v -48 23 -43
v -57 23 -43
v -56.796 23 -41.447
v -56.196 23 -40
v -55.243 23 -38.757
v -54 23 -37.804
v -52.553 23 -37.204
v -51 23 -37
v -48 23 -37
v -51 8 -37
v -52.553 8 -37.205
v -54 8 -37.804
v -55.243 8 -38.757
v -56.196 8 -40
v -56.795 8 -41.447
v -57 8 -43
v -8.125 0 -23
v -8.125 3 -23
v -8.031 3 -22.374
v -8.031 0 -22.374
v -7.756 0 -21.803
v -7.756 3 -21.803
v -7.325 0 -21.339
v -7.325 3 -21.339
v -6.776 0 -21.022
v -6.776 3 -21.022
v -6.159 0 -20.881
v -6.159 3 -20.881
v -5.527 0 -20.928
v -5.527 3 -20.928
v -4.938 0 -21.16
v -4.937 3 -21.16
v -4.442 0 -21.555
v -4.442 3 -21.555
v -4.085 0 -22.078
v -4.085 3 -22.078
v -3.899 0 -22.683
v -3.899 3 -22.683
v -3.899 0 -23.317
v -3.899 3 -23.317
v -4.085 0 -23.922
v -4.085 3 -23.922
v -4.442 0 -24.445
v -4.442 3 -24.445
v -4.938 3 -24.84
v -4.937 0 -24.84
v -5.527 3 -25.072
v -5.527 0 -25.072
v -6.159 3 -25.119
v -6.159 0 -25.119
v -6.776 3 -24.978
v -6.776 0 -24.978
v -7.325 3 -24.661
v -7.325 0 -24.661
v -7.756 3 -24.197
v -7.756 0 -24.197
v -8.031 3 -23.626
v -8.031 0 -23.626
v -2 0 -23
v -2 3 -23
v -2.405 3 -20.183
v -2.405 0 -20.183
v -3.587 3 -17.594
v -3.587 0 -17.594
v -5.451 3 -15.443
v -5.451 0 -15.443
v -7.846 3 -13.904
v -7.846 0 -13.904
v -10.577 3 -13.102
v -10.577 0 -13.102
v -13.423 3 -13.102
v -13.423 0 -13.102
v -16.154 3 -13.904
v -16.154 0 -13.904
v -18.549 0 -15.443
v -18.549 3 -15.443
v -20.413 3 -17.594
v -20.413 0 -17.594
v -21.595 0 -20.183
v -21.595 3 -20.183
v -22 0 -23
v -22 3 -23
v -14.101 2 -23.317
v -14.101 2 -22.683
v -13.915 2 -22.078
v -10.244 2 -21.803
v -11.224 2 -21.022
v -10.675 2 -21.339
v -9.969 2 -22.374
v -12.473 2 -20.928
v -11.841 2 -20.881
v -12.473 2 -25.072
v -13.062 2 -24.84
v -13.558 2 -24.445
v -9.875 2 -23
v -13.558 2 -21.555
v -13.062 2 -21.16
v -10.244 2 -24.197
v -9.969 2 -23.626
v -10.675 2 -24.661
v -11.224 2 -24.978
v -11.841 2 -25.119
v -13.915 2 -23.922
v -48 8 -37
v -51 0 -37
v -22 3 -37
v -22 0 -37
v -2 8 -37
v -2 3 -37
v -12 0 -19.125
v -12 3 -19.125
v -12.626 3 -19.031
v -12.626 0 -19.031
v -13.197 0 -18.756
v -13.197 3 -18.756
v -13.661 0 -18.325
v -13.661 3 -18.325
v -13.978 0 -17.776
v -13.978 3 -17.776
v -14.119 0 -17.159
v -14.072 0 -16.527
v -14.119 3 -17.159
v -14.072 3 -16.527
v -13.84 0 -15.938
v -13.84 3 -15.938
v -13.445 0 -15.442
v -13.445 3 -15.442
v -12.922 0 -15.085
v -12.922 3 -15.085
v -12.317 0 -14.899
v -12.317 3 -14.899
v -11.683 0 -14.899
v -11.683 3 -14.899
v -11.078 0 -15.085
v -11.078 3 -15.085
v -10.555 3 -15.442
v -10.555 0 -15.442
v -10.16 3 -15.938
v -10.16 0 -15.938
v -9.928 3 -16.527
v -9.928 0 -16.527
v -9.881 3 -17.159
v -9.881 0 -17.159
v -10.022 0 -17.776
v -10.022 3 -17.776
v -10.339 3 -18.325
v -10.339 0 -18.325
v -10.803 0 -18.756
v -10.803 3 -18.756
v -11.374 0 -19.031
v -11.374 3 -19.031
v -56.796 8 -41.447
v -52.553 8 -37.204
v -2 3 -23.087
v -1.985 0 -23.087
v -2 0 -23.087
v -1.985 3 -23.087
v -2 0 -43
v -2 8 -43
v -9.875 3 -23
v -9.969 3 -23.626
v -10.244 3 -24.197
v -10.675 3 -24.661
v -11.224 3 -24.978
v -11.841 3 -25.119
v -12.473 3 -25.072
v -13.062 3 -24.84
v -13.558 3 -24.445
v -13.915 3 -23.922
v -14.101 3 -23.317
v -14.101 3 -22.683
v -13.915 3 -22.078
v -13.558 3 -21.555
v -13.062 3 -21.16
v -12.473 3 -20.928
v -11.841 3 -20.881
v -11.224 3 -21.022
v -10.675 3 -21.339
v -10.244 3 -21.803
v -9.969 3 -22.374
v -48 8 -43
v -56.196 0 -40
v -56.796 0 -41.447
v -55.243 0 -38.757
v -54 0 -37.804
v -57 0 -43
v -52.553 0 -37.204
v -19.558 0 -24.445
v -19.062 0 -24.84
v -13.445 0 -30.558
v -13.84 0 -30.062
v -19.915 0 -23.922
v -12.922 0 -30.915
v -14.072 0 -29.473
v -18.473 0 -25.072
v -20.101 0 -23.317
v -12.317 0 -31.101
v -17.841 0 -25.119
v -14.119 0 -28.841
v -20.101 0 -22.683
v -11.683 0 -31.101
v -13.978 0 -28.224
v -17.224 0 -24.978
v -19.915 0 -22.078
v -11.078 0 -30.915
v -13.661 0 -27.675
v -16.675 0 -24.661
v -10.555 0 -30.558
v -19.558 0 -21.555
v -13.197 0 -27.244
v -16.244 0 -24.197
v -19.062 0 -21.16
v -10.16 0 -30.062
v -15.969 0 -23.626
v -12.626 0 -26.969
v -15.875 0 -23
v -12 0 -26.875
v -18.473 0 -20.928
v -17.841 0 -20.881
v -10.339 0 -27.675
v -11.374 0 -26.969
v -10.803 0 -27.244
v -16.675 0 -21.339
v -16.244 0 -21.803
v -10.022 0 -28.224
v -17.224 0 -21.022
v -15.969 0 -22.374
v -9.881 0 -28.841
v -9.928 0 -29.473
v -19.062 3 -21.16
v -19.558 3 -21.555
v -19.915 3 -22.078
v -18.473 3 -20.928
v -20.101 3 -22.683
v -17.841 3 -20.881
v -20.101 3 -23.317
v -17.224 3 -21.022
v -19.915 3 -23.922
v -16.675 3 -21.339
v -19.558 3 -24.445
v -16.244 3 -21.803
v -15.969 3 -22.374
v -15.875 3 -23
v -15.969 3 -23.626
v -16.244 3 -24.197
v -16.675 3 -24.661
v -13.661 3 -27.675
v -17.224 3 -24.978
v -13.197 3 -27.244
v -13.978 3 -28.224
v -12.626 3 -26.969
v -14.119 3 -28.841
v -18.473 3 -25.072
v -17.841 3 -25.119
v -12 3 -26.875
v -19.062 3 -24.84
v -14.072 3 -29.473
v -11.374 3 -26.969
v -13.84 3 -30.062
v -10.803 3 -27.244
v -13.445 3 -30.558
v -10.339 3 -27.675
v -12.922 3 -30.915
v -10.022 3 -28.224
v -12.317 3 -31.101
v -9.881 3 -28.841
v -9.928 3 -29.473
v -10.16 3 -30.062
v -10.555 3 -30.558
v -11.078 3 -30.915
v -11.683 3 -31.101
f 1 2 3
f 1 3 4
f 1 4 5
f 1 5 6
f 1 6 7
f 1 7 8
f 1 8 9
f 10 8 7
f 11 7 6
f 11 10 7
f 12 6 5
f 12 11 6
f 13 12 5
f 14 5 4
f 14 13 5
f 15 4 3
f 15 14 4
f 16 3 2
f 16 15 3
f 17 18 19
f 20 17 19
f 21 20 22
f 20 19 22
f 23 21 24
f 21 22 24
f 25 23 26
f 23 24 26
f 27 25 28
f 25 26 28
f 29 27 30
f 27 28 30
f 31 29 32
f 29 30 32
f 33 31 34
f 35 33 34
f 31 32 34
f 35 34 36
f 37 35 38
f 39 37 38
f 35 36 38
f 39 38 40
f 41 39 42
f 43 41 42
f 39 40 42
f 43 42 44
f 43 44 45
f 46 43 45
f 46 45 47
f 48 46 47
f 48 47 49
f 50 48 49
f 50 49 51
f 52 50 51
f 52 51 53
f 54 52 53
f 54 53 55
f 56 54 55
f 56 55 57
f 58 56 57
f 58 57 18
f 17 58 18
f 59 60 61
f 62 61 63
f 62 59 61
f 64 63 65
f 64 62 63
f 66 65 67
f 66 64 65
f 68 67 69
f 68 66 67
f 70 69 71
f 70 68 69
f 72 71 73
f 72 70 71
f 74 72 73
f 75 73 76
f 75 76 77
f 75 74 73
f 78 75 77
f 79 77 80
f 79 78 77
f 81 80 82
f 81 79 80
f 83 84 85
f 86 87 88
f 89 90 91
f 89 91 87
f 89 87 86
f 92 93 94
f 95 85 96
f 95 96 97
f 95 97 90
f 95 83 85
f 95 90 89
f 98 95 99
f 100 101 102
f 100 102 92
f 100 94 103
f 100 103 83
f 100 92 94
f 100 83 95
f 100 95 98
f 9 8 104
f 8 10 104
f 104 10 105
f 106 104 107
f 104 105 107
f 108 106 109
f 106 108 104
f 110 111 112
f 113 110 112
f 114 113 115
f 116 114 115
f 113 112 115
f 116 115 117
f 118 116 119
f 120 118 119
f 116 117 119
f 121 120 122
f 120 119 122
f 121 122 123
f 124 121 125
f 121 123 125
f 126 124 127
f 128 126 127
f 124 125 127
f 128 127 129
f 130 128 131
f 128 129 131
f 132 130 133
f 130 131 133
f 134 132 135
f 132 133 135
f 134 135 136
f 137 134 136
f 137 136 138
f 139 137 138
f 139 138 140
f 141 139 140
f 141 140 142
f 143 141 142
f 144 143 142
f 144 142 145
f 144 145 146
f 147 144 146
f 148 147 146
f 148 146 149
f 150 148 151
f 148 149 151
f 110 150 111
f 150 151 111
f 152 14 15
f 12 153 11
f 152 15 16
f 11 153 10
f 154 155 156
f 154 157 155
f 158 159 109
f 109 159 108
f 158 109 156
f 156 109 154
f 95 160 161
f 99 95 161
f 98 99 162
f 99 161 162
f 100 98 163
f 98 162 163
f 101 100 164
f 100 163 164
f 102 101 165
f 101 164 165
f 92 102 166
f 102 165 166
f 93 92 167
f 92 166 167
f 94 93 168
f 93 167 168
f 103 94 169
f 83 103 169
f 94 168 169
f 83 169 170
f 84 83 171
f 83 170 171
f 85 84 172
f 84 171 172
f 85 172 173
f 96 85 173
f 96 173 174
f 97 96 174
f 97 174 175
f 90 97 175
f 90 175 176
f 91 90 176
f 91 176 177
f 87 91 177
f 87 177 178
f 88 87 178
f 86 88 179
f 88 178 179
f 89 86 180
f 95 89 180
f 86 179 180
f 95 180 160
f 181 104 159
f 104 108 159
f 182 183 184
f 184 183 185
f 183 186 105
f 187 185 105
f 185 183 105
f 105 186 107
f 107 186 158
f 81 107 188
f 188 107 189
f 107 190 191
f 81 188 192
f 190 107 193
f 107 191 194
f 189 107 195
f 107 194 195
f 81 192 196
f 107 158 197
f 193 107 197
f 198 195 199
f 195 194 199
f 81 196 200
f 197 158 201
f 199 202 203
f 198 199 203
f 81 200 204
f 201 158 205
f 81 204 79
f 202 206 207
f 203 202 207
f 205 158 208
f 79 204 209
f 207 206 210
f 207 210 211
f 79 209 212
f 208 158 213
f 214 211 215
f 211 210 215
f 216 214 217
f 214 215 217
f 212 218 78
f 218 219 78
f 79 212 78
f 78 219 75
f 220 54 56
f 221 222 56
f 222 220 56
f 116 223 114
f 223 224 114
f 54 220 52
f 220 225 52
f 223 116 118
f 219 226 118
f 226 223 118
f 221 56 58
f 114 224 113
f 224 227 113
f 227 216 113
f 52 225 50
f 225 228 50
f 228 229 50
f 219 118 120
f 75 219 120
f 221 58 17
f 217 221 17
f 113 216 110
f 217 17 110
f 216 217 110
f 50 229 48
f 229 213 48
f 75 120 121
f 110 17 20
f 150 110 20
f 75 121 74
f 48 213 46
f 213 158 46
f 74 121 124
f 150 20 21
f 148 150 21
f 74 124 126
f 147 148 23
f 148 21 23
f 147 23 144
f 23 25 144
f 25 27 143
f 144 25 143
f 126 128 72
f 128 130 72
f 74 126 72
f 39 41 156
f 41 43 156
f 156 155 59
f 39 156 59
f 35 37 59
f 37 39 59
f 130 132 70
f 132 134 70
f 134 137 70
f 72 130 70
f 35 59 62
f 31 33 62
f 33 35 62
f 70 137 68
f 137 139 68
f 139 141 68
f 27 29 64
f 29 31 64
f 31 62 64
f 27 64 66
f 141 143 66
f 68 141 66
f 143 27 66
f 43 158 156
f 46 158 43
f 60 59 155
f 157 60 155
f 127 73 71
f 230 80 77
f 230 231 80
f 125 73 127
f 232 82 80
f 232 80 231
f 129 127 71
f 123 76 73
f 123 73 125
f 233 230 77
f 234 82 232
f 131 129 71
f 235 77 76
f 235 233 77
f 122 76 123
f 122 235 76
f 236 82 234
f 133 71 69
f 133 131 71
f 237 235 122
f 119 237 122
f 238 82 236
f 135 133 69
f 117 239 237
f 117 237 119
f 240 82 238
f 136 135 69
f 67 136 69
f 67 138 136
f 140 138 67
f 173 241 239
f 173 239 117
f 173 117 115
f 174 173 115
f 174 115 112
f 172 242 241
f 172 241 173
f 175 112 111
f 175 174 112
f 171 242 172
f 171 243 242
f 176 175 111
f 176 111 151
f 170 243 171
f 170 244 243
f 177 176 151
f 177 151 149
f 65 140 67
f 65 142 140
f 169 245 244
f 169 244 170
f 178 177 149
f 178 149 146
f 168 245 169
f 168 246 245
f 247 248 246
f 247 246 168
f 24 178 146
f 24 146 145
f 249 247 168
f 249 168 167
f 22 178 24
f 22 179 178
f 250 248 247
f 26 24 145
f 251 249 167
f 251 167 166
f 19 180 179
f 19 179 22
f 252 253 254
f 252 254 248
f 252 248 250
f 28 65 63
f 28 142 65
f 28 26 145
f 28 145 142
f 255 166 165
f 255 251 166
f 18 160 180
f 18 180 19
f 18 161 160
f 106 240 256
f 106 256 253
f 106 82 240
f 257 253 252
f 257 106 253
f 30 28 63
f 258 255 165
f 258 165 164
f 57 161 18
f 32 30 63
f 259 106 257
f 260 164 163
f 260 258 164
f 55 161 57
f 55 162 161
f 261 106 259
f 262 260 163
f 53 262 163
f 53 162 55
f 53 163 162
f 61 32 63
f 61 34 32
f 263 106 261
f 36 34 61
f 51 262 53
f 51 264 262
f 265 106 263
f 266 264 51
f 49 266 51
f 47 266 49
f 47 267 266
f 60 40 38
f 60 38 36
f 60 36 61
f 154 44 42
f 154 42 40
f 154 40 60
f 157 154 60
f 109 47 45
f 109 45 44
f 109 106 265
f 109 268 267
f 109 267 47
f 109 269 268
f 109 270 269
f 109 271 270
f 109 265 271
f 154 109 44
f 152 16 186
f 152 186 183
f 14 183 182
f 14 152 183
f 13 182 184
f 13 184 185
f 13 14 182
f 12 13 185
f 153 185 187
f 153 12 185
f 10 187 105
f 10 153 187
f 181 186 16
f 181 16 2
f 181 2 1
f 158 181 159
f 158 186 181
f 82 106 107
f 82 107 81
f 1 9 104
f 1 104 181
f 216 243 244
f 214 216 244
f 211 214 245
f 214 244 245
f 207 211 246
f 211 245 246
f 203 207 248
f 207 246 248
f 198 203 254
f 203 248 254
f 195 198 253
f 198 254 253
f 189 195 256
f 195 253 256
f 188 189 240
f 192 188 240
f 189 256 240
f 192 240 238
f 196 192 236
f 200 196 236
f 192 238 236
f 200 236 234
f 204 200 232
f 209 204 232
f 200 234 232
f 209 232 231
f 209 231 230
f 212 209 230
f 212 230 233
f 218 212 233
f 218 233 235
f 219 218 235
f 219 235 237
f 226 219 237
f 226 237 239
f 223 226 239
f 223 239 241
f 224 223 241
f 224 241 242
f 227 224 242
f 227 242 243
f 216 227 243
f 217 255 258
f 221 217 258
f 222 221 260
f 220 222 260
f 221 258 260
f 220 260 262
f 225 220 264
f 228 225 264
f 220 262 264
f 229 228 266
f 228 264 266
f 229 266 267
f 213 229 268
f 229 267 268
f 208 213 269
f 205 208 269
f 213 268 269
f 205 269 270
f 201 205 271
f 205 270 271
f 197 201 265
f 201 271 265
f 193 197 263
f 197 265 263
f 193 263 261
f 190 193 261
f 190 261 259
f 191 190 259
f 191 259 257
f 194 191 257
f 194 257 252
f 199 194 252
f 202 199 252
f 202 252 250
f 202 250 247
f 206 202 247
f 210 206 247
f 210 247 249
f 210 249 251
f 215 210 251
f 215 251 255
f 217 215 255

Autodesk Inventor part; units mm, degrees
ref_plane "YZ Plane" through (0, 0, 0) normal (1, 0, 0) x (0, 1, 0)
ref_plane "XZ Plane" through (0, 0, 0) normal (0, 1, 0) x (-1, 0, 0)
ref_plane "XY Plane" through (0, 0, 0) normal (0, 0, 1) x (1, 0, 0)
sketch "Sketch1" plane through (0, 0, 0) normal (0, 1, 0) x (-1, 0, 0)
  line L0 (0, 0) -> (24, 0)
  line L1 (12, 0) -> (12, -5)
  circle A0 centre (12, -5) radius 2.125
  dimension "d0" = 24
  dimension "d1" = 5
  dimension "d2" = 4.25
sketch "Sketch2" plane through (0, 0, 0) normal (0, 1, 0) x (-1, 0, 0)
  line L0 (24, 0) -> (24, 30)
  line L1 (24, 30) -> (0, 30)
  line L2 (0, 0) -> (0, -12.5)
  line L3 (0, -12.5) -> (24, -12.5)
  line L4 (24, -12.5) -> (24, 0)
  line L5 (0, 25) -> (0, 0)
  line L6 (0, 25) -> (-29.86, 25)
  line L7 (0, 30) -> (-29.86, 30)
  line L8 (-29.86, 30) -> (-29.86, 25)
  dimension "d3" = 24
  dimension "d4" = 30
  dimension "d5" = 12.5
  dimension "d6" = 5
  dimension "d20" = 29.86
extrude "Extrusion1" add sketch "Sketch2" along normal blind 8
extrude "Extrusion2" cut sketch "Sketch1" along normal through all
pattern_linear "Rectangular Pattern1" count 2 spacing 6 along (1, 0, 0) count 2 spacing 6 along (-1, 0, 0) of "Extrusion2"
sketch "Sketch4" plane through (-24, 0, -12.5) normal (-1, 0, 0) x (0, 0, 1)
  point P0 (12.5, 0)
sketch "Sketch5" plane through (0, 8, 0) normal (0, 1, 0) x (1, 0, 0)
  line L0 (0, 0) -> (0, 12.5)
  line L1 (0, 12.5) -> (-24, 12.5)
  line L2 (-24, 12.5) -> (-24, 0)
  line L3 (-24, 0) -> (0, 0)
  line L4 (0, -25) -> (0, 12.5) projected
extrude "Extrusion3" cut sketch "Sketch5" against normal blind 5
sketch "Sketch6" plane through (0, 8, 0) normal (0, 1, 0) x (1, 0, 0)
  line L0 (13.1425, -25) -> (13.1425, 25)
  circle A0 centre (-12, 5) radius 2.125 projected
  line L1 (-12, 5) -> (-12, 23)
  circle A1 centre (-12, 23) radius 10
  line L2 (21.1928, 30) -> (23.1928, 30)
  line L3 (0, 35) -> (20, 35)
  line L4 (20, 35) -> (30.8046, 35) construction
  line L5 (20, 35) -> (37.0437, 35) construction
  line L6 (20, 35) -> (24.8301, 36.2923)
  line L7 (17.3205, 25) -> (22.3205, 25) construction
  line L8 (17.3205, 25) -> (12.3205, 25)
  line L9 (-2, 23) -> (0, 35)
  line L10 (-22, 23) -> (-22, 41)
  line L11 (-22, 41) -> (30, 41)
  line L12 (30, 41) -> (24.8301, 36.2923)
  point P0 (0, 0)
  dimension "d23" = 50
  dimension "d25" = 18
  dimension "d26" = 20
  dimension "d42" = 2
  dimension "d45" = 20
  dimension "d47" = 20
  dimension "d52" = 5
  dimension "d63" = 5
  dimension "d66" = 52
  dimension "d67" = 18
sketch "Sketch7" plane through (0, 0, 0) normal (0, -1, 0) x (1, 0, 0)
  circle A0 centre (-12, -5) radius 2.125 projected
  line L0 (-12, -5) -> (-12, -23)
  circle A1 centre (-12, -23) radius 10
  line L1 (-22, -23) -> (-22, -41)
  line L2 (-22, -41) -> (30, -41)
  line L3 (0, -34.9999) -> (20, -34.9999)
  line L4 (20, -34.9999) -> (24.851, -36.2115)
  line L5 (24.851, -36.2115) -> (30, -41)
  line L6 (0, -34.9999) -> (-2, -23)
  point P0 (0, 0)
  dimension "d27" = 18
  dimension "d28" = 20
  dimension "d68" = 18
  dimension "d69" = 52
  dimension "d70" = 20
  dimension "d71" = 5
extrude "Extrusion4" add sketch "Sketch7" against normal blind 3 contours A1
sketch "Sketch8" plane through (-12, 3, -23) normal (0, 1, 0) x (1, 0, 0)
  circle A0 centre (0, 0) radius 2.125
  point P0 (12, -23)
  dimension "d31" = 4.25
extrude "Extrusion5" cut sketch "Sketch8" against normal blind 1
sketch "Sketch9" plane through (-12, 3, -23) normal (0, 1, 0) x (1, 0, 0)
  line L0 (0, 0) -> (-6, 0)
  circle A0 centre (-6, 0) radius 2.125
  point P0 (12, -23)
  dimension "d34" = 6
  dimension "d35" = 4.25
extrude "Extrusion6" cut sketch "Sketch9" against normal through all
pattern_circular "Circular Pattern1" count 4 over 360 about axis through (-12, 0, -23) along (0, 1, 0) of "Extrusion6"
sketch "Sketch10" plane through (-12, 0, -23) normal (0, -1, 0) x (1, 0, 0)
  circle A0 centre (0, 0) radius 10 projected
  line L0 (-10, 0) -> (-10, -18)
  line L1 (-10, -18) -> (42, -18)
  line L2 (12, -12) -> (32, -12)
  line L3 (32, -12) -> (36.8295, -13.2918)
  line L4 (36.8295, -13.2918) -> (42, -18)
  arc A1 (-10, 0) -> (10, 0) centre (0, 0) ccw
  line L5 (10, 0) -> (12, -12)
  point P0 (12, 23)
  dimension "d72" = 18
  dimension "d73" = 52
  dimension "d74" = 20
extrude "Extrusion7" add sketch "Sketch10" against normal blind 8 contours L5 L2 L3 L4 L1 L0 A0
sketch "Sketch11" plane through (0, 0, 25) normal (1, 0, 0) x (0, 0, -1)
  line L0 (25, 8) -> (37.5, 8)
  line L1 (37.5, 8) -> (37.5, 4)
  line L2 (37.5, 4) -> (25, 4)
  line L3 (25, 4) -> (25, 8)
  point P0 (25, 0)
  dimension "d77" = 4
extrude "Extrusion8" add sketch "Sketch11" against normal blind 24
sketch "Sketch12" plane through (0, 8, 0) normal (0, 1, 0) x (1, 0, 0)
  circle A0 centre (-12, 5) radius 2.125 projected
  circle A1 centre (-12, 5) radius 2.125
  point P0 (0, 0)
  dimension "d80" = 4.25
extrude "Extrusion9" cut sketch "Sketch12" against normal through all
pattern_linear "Rectangular Pattern2" count 3 spacing 6 along (1, 0, 0) of "Extrusion9"
sketch "Sketch13" plane through (0, 8, 0) normal (0, 1, 0) x (1, 0, 0)
  line L0 (30, 41) -> (29.8598, -25)
  point P0 (0, 0)
  point P1 (29.86, -25)
fillet "Fillet1" radius 5 1 edges at (29.86, 4, 30)
sketch "Sketch14" plane through (0, 0, 25) normal (1, 0, 0) x (0, 0, -1)
  line L0 (37.5, 3) -> (25, 3)
  line L1 (25, 3) -> (25, 0)
  line L2 (25, 0) -> (37.5, 0)
  line L3 (37.5, 0) -> (37.5, 3)
  line L4 (37.5, 0) -> (66, 0)
  line L5 (66, 0) -> (66, 8)
  line L6 (66, 8) -> (37.5, 8)
  line L7 (37.5, 8) -> (37.5, 0)
sketch "Sketch15" plane through (0, 0, 25) normal (1, 0, 0) x (0, 0, -1)
  point P0 (25, 0)
sketch "Sketch16" plane through (-24, 0, -12.5) normal (-1, 0, 0) x (0, 0, 1)
  line L0 (0, 8) -> (42.5, 8) projected
  line L1 (0, 4) -> (12.5, 4)
  line L2 (12.5, 4) -> (12.5, 8)
  line L3 (12.5, 8) -> (0, 8)
  line L4 (0, 8) -> (0, 4)
  line L5 (-0.5, 0) -> (-10.5, 0) projected
  line L6 (-0.5431, 0) -> (-28.5, 0)
  line L7 (-28.5, 0) -> (-28.5, 8)
  line L8 (-28.5, 8) -> (-0.5431, 8)
  line L9 (-0.5431, 8) -> (-0.5431, 0)
  point P0 (12.5, 0)
sketch "Sketch17" plane through (0, 8, 0) normal (0, 1, 0) x (1, 0, 0)
  line L0 (-28.6904, -36.0385) -> (31.2177, -36.0385)
  line L1 (31.2177, -36.0385) -> (31.2177, 12.5)
  line L2 (31.2177, 12.5) -> (-28.6904, 12.5)
  line L3 (-28.6904, 12.5) -> (-28.6904, -36.0385)
  point P0 (0, 0)
extrude "Extrusion10" cut sketch "Sketch17" against normal through all
sketch "Sketch18" plane through (-12, 8, -23) normal (0, 1, 0) x (1, 0, 0)
  line L0 (12, 12) -> (12, 14)
  line L1 (12, 14) -> (-10, 14)
  line L2 (-10, 14) -> (-10, 0)
  line L3 (-10, 0) -> (12, 0)
  line L4 (12, 0) -> (12, 14)
  point P0 (12, -23)
  dimension "d89" = 2
extrude "Extrusion11" cut sketch "Sketch18" against normal blind 5
sketch "Sketch19" plane through (-22, 0, -41) normal (-1, 0, 0) x (0, 0, 1)
  line L0 (0, 0) -> (-2, 0)
  line L1 (-2, 0) -> (-2, 8)
  line L2 (-2, 8) -> (0, 8)
  line L3 (0, 8) -> (0, 0)
  point P0 (41, 0)
  dimension "d92" = 2
extrude "Extrusion12" add sketch "Sketch19" against normal blind 20
sketch "Sketch20" plane through (-12, 8, -23) normal (0, 1, 0) x (1, 0, 0)
  line L0 (10, 20) -> (42.0506, 20)
  line L1 (42.0506, 20) -> (42.0506, 0.0873)
  line L2 (42.0506, 0.0873) -> (10, 0.0873)
  line L3 (10, 0.0873) -> (10, 20)
  point P0 (12, -23)
extrude "Extrusion13" cut sketch "Sketch20" against normal through all
sketch "Sketch21" plane through (-22, 0, -23) normal (-1, 0, 0) x (0, 0, 1)
  line L0 (-20, 0) -> (-14, 0)
  line L1 (-14, 0) -> (-14, 8)
  line L2 (-14, 8) -> (-20, 8)
  line L3 (-20, 8) -> (-20, 0)
  point P0 (23, 0)
extrude "Extrusion14" add sketch "Sketch21" along normal blind 35
sketch "Sketch22" plane through (0, 0, 0) normal (0, -1, 0) x (1, 0, 0)
  point P0 (0, 0)
fillet "Fillet2" radius 6 1 edges at (-57, 4, -37)
sketch "Sketch24" plane through (-12, 8, -23) normal (0, 1, 0) x (1, 0, 0)
  arc A0 (-45, 20) -> (-39, 14) centre (-39, 20) ccw
  line L0 (-39, 14) -> (-36, 14)
  line L1 (-10, 14) -> (-39, 14) projected
  line L2 (-36, 14) -> (-36, 20)
  line L3 (-45, 20) -> (10, 20) projected
  point P0 (12, -23)
  dimension "d101" = 3
extrude "Extrusion15" add sketch "Sketch24" along normal blind 15
equation "\"d81\" = d80"
properties part number "CraneGripper"
